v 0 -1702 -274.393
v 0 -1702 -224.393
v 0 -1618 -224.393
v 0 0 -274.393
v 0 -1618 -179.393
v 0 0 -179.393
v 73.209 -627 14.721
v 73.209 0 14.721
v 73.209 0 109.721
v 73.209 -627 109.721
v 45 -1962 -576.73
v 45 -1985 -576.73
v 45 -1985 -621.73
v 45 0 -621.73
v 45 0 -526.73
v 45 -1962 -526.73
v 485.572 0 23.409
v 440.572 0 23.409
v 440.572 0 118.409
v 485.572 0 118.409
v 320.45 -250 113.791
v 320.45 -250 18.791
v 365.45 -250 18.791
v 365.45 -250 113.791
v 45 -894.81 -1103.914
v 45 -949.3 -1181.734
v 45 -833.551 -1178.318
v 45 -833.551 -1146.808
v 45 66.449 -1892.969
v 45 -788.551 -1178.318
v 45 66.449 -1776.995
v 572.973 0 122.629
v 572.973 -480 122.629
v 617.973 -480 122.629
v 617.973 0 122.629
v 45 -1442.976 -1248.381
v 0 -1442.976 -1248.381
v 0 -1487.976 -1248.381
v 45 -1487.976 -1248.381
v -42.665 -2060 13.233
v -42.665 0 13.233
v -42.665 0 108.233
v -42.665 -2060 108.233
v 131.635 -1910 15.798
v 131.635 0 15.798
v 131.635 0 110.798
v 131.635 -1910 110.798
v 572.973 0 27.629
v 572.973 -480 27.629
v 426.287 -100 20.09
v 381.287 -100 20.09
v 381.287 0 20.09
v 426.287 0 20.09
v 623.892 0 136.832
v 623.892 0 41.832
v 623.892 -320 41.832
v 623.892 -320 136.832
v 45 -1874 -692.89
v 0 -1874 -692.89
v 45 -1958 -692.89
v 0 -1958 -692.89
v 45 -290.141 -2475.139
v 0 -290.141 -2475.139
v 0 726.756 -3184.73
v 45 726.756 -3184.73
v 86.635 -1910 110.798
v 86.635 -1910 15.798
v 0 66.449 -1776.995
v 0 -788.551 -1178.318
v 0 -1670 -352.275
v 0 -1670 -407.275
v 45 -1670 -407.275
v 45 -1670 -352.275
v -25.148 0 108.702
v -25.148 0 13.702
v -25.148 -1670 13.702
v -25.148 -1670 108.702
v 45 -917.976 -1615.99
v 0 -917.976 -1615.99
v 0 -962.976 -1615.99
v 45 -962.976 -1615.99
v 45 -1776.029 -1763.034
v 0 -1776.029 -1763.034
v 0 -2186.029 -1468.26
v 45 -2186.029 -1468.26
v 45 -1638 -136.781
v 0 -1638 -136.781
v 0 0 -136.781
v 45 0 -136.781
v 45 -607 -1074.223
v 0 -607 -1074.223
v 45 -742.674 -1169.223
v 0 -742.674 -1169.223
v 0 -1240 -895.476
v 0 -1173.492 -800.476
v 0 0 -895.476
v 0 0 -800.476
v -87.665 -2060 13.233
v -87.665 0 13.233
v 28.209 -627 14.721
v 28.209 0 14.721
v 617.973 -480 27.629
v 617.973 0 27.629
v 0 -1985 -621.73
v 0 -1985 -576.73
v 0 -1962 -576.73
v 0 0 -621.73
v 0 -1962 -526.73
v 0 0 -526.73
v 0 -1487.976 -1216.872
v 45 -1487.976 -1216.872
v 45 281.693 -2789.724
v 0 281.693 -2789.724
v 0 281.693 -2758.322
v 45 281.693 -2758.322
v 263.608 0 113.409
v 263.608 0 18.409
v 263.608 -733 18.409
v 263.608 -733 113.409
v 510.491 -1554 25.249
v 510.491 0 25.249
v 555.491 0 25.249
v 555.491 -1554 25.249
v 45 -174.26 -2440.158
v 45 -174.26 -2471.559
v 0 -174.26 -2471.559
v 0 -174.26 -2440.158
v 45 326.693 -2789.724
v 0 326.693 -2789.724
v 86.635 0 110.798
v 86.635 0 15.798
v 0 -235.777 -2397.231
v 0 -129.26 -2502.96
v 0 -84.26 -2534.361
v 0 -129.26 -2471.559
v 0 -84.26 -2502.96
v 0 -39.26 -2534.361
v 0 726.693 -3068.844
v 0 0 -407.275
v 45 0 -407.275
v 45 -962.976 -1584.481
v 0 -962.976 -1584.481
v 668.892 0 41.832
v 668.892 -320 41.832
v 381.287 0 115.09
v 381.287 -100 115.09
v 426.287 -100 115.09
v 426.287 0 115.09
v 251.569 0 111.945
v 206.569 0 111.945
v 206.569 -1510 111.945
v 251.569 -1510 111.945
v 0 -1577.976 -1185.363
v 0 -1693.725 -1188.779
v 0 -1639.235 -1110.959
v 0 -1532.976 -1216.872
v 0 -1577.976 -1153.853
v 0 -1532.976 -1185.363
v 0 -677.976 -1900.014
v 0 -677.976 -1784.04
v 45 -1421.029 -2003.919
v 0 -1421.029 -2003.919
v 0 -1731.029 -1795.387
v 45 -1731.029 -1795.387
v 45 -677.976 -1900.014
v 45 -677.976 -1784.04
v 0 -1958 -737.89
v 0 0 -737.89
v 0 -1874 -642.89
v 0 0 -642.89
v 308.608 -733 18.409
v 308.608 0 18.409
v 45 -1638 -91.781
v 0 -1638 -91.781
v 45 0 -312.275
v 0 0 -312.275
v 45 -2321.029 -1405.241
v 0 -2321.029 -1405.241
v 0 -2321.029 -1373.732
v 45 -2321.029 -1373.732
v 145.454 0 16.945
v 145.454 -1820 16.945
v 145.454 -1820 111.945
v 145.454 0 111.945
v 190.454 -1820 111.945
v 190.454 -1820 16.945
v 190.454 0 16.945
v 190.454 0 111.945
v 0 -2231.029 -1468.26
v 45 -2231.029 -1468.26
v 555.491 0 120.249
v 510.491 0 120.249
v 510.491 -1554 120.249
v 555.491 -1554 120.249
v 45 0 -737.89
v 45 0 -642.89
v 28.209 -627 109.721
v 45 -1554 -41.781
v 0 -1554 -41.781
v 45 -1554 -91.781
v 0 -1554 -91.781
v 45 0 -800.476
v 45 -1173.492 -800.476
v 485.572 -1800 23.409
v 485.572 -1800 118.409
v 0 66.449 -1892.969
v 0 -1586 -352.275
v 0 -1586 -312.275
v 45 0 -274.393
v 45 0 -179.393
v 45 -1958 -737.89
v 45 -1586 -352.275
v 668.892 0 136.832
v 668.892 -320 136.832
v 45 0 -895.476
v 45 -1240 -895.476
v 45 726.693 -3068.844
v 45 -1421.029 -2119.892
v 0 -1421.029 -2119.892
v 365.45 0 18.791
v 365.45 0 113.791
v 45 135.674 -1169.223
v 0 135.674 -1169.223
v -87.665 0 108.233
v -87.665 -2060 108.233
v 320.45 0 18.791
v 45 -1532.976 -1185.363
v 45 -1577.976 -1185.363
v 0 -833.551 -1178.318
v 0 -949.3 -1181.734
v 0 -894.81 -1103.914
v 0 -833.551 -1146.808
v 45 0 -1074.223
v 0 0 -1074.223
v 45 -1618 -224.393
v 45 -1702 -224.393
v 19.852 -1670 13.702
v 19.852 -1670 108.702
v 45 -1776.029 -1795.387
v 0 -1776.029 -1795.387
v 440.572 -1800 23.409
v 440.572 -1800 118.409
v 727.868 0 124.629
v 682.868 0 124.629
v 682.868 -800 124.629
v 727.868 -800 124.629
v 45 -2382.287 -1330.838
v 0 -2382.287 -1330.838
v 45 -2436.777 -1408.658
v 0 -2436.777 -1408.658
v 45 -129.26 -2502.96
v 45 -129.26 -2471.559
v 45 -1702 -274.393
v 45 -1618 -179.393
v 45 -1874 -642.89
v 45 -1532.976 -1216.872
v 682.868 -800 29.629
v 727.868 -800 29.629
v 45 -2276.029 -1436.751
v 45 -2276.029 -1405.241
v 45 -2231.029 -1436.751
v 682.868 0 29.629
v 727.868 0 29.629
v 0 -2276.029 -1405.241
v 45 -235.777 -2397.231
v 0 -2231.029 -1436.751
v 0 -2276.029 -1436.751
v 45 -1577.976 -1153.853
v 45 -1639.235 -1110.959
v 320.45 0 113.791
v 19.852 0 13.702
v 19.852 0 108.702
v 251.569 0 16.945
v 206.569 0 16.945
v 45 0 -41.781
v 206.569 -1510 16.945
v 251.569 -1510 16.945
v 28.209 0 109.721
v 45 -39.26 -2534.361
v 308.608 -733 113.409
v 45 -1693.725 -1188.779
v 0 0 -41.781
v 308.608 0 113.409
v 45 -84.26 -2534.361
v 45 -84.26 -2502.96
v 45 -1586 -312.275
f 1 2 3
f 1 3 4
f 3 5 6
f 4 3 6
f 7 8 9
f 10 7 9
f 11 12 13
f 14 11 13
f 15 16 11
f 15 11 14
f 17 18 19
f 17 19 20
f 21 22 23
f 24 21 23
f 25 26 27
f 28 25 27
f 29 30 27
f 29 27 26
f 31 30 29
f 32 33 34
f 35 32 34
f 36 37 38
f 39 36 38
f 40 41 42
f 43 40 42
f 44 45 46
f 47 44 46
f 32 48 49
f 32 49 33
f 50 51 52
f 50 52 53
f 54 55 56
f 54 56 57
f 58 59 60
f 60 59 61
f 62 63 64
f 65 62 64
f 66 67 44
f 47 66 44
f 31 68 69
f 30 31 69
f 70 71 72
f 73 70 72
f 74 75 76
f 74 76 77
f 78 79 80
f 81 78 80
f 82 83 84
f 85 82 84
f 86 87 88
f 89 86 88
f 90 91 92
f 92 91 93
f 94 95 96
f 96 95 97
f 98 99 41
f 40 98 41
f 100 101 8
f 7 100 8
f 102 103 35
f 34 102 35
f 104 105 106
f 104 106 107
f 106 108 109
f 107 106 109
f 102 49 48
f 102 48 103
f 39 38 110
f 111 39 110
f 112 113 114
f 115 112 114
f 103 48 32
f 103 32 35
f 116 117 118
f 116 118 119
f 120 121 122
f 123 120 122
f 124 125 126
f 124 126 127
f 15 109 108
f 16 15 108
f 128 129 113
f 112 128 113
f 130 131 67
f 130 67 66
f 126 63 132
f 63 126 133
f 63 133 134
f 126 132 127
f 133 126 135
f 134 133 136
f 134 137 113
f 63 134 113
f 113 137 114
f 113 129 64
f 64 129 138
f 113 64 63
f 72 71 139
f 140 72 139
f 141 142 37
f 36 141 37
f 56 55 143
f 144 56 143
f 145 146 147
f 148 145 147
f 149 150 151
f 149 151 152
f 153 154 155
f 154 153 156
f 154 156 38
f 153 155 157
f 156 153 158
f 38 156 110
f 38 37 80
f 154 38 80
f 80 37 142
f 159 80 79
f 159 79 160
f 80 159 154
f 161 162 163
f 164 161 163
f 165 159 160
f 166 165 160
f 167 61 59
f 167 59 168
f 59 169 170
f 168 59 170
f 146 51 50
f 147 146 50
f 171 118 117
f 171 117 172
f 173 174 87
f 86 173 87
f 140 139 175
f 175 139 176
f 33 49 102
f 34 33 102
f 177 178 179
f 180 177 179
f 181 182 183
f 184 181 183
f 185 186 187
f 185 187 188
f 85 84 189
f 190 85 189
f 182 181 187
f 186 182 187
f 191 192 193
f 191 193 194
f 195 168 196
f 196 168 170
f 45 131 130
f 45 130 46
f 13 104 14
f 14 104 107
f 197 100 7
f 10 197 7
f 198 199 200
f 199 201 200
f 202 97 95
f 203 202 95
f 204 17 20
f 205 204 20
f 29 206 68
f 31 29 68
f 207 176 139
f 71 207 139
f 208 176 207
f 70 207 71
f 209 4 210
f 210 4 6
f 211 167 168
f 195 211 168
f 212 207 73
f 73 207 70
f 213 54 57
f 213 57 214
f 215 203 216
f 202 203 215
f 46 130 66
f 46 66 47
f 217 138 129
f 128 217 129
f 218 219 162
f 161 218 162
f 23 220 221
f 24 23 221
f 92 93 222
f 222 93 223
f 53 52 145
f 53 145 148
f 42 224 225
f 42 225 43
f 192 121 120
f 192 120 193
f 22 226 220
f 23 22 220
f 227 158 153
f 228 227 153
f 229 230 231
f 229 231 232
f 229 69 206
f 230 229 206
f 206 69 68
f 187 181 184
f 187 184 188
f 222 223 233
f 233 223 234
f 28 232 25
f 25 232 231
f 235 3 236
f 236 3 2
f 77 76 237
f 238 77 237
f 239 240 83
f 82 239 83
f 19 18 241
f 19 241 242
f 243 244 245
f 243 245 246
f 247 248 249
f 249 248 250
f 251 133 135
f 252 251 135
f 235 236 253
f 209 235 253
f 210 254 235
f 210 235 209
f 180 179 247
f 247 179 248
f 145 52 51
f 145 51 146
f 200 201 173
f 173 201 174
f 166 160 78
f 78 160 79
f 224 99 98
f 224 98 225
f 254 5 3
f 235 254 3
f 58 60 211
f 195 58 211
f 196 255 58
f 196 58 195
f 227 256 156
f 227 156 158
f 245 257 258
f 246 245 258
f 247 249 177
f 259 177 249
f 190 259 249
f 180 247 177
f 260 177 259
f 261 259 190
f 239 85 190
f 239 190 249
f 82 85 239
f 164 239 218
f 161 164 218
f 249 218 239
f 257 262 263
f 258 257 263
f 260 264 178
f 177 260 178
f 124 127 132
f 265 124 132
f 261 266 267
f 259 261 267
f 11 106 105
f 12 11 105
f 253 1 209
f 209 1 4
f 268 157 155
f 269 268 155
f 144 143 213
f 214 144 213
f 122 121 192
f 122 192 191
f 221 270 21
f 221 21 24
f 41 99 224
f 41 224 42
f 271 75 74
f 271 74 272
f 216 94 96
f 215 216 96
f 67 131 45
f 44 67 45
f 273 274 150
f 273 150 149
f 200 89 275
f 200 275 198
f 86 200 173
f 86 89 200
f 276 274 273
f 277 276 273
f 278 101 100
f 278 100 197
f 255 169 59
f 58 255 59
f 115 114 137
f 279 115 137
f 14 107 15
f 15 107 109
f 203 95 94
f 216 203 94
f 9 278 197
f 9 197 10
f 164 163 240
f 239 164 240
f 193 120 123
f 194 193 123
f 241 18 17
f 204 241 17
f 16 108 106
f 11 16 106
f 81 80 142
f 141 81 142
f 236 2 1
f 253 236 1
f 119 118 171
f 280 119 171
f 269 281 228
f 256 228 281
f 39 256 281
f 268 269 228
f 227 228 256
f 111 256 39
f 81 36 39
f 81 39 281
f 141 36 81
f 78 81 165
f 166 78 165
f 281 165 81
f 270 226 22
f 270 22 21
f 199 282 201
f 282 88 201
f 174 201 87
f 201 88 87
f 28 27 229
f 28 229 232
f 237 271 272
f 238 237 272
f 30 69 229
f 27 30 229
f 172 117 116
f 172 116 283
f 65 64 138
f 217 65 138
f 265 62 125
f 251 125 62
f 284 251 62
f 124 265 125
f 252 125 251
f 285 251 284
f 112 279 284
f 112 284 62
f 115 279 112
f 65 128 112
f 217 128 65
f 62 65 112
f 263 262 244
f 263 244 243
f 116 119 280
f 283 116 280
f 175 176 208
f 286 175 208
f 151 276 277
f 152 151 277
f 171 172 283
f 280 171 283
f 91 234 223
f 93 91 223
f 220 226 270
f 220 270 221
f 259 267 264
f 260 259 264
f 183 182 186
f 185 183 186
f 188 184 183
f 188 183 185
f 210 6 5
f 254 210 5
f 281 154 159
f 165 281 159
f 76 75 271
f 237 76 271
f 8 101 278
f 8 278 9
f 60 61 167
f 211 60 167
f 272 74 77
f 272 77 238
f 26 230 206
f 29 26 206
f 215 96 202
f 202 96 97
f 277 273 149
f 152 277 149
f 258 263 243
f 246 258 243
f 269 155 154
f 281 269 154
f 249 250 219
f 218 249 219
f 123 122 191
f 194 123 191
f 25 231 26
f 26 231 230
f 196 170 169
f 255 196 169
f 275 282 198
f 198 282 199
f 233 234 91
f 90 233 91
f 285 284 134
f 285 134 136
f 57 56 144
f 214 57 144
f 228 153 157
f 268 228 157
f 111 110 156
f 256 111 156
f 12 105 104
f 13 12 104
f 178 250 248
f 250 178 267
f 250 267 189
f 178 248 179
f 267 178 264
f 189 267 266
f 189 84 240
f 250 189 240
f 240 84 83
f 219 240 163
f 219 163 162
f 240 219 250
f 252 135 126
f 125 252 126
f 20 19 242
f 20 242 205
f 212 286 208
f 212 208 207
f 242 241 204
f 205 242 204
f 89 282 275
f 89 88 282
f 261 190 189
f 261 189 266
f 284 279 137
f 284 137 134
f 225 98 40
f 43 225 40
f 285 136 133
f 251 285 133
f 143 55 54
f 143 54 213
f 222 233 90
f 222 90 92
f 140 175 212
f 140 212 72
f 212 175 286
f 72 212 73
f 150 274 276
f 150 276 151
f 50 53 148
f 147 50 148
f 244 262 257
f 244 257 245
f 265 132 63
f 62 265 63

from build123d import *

# Parameters (mm, degrees)
F0_W      = 45
F0_H      = 95
F1_DEPTH  = 2060
F2_W      = 45
F2_H      = 95
F3_DEPTH  = 1670
F4_W      = 45
F4_H      = 95
F5_DEPTH  = 627
F6_W      = 45
F6_H      = 95
F7_DEPTH  = 1910
F8_W      = 45
F8_H      = 95
F10_DEPTH = 1820
F9_W      = 45
F9_H      = 95
F11_DEPTH = 1510
F12_W     = 45
F12_H     = 95
F14_DEPTH = 733
F13_W     = 45
F13_H     = 95
F15_DEPTH = 250
F16_W     = 45
F16_H     = 95
F17_DEPTH = 100
F18_W     = 45
F18_H     = 95
F20_DEPTH = 1800
F19_W     = 45
F19_H     = 95
F21_DEPTH = 1554
F23_DEPTH = 45
F25_DEPTH = 45
F26_DEPTH = 5
F27_DEPTH = 5
F29_DEPTH = 45
F31_DEPTH = 45
F32_W     = 45
F32_H     = 95
F33_DEPTH = 480
F34_DEPTH = 5
F35_DEPTH = 5
F37_DEPTH = 45
F38_W     = 45
F38_H     = 95
F40_DEPTH = 320
F39_W     = 45
F39_H     = 95
F41_DEPTH = 800
F43_DEPTH = 45
F46_DEPTH = 45
F47_DEPTH = 45
F49_DEPTH = 45


with BuildPart() as f1:
    # F0 (on Front) → F1 (new body)
    with BuildSketch(Plane.XZ):
        with Locations((-65.1652917266, 60.7334716618)):
            Rectangle(F0_W, F0_H)
    extrude(amount=F1_DEPTH)


with BuildPart() as f3:
    # F2 (on Front) → F3 (new body)
    with BuildSketch(Plane.XZ):
        with Locations((-2.6481477171, 61.2016577646)):
            Rectangle(F2_W, F2_H)
    extrude(amount=F3_DEPTH)


with BuildPart() as f5:
    # F4 (on Front) → F5 (new body)
    with BuildSketch(Plane.XZ):
        with Locations((50.708630085, 62.2210871801)):
            Rectangle(F4_W, F4_H)
    extrude(amount=F5_DEPTH)


with BuildPart() as f7:
    # F6 (on Front) → F7 (new body)
    with BuildSketch(Plane.XZ):
        with Locations((109.135299027, 63.2982166857)):
            Rectangle(F6_W, F6_H)
    extrude(amount=F7_DEPTH)


with BuildPart() as f10:
    # F8 (on Front) → F10 (new body)
    with BuildSketch(Plane.XZ):
        with Locations((167.9542428255, 64.4452819973)):
            Rectangle(F8_W, F8_H)
    extrude(amount=F10_DEPTH)


with BuildPart() as f11:
    # F9 (on Front) → F11 (new body)
    with BuildSketch(Plane.XZ):
        with Locations((229.06876266, 64.4452819973)):
            Rectangle(F9_W, F9_H)
    extrude(amount=F11_DEPTH)


with BuildPart() as f14:
    # F12 (on Front) → F14 (new body)
    with BuildSketch(Plane.XZ):
        with Locations((286.1079359055, 65.9090528637)):
            Rectangle(F12_W, F12_H)
    extrude(amount=F14_DEPTH)


with BuildPart() as f15:
    # F13 (on Front) → F15 (new body)
    with BuildSketch(Plane.XZ):
        with Locations((342.9496204853, 66.2910441309)):
            Rectangle(F13_W, F13_H)
    extrude(amount=F15_DEPTH)


with BuildPart() as f17:
    # F16 (on Front) → F17 (new body)
    with BuildSketch(Plane.XZ):
        with Locations((403.7870085239, 67.5900323689)):
            Rectangle(F16_W, F16_H)
    extrude(amount=F17_DEPTH)


with BuildPart() as f20:
    # F18 (on Front) → F20 (new body)
    with BuildSketch(Plane.XZ):
        with Locations((463.072232008, 70.9092958272)):
            Rectangle(F18_W, F18_H)
    extrude(amount=F20_DEPTH)


with BuildPart() as f21:
    # F19 (on Front) → F21 (new body)
    with BuildSketch(Plane.XZ):
        with Locations((532.9907751083, 72.7492576838)):
            Rectangle(F19_W, F19_H)
    extrude(amount=F21_DEPTH)


with BuildPart() as f23:
    # F22 (on Right) → F23 (new body)
    with BuildSketch(Plane.YZ):
        Polygon((-1638, -136.78124547), (0, -136.78124547), (0, -46.78124547), (-1554, -46.78124547), (-1554, -91.78124547), (-1638, -91.78124547), align=None)
    extrude(amount=F23_DEPTH)

    # F26 (add): a face of the model
    f26_faces = [f23.faces().sort_by_distance(p)[0] for p in [
        (22.5, -777, -46.78124547),
    ]]
    extrude(f26_faces, amount=F26_DEPTH)


with BuildPart() as f25:
    # F24 (on Right) → F25 (new body)
    with BuildSketch(Plane.YZ):
        Polygon((0, -407.274633646), (0, -312.274633646), (-1586, -312.274633646), (-1586, -357.274633646), (-1670, -357.274633646), (-1670, -407.274633646), align=None)
    extrude(amount=F25_DEPTH)

    # F27 (add): a face of the model
    f27_faces = [f25.faces().sort_by_distance(p)[0] for p in [
        (22.5, -1628, -357.274633646),
    ]]
    extrude(f27_faces, amount=F27_DEPTH)

    # F34 (add): a face of the model
    f34_faces = [f25.faces().sort_by_distance(p)[0] for p in [
        (22.5, -1628, -352.274633646),
    ]]
    extrude(f34_faces, amount=-F34_DEPTH)

    # F35 (add): a face of the model
    f35_faces = [f25.faces().sort_by_distance(p)[0] for p in [
        (22.5, -1628, -352.274633646),
    ]]
    extrude(f35_faces, amount=-F35_DEPTH)


with BuildPart() as f29:
    # F28 (on Right) → F29 (new body)
    with BuildSketch(Plane.YZ):
        Polygon((0, -274.3932902813), (0, -179.3932902813), (-1618, -179.3932902813), (-1618, -224.3932902813), (-1702, -224.3932902813), (-1702, -274.3932902813), align=None)
    extrude(amount=F29_DEPTH)


with BuildPart() as f31:
    # F30 (on Right) → F31 (new body)
    with BuildSketch(Plane.YZ):
        Polygon((0, -621.7302680016), (0, -526.7302680016), (-1962, -526.7302680016), (-1962, -576.7302680016), (-1985, -576.7302680016), (-1985, -621.7302680016), align=None)
    extrude(amount=F31_DEPTH)


with BuildPart() as f33:
    # F32 (on Front) → F33 (new body)
    with BuildSketch(Plane.XZ):
        with Locations((595.4729533195, 75.1294462383)):
            Rectangle(F32_W, F32_H)
    extrude(amount=F33_DEPTH)


with BuildPart() as f37:
    # F36 (on Right) → F37 (new body)
    with BuildSketch(Plane.YZ):
        Polygon((0, -737.8901839256), (0, -642.8901839256), (-1874, -642.8901839256), (-1874, -692.8901839256), (-1958, -692.8901839256), (-1958, -737.8901839256), align=None)
    extrude(amount=F37_DEPTH)


with BuildPart() as f40:
    # F38 (on Front) → F40 (new body)
    with BuildSketch(Plane.XZ):
        with Locations((646.3923239708, 89.3315157294)):
            Rectangle(F38_W, F38_H)
    extrude(amount=F40_DEPTH)


with BuildPart() as f41:
    # F39 (on Front) → F41 (new body)
    with BuildSketch(Plane.XZ):
        with Locations((705.3681993484, 77.1294745058)):
            Rectangle(F39_W, F39_H)
    extrude(amount=F41_DEPTH)


with BuildPart() as f43:
    # F42 (on Right) → F43 (new body)
    with BuildSketch(Plane.YZ):
        Polygon((0, -895.4758358002), (0, -800.4758358002), (-1173.492193222, -800.4758358002), (-1240, -895.4758358002), align=None)
    extrude(amount=F43_DEPTH)


with BuildPart() as f46:
    # F45 (on Right) → F46 (new body)
    with BuildSketch(Plane.YZ):
        Polygon((0, -1074.2228031158), (-607, -1074.2228031158), (-742.6740606405, -1169.2228031158), (-607, -1169.2228031158), (135.6740606405, -1169.2228031158), align=None)
    extrude(amount=F46_DEPTH)


with BuildPart() as f47:
    # F44 (on Right) → F47 (new body)
    with BuildSketch(Plane.YZ):
        Polygon((-894.810178936, -1103.9144259572), (-949.2999403894, -1181.7338701647), (66.448594529, -1892.96865124), (66.448594529, -1776.9950653076), (-173.551405471, -1608.9452561373), (-218.551405471, -1577.4359169179), (-788.551405471, -1178.3176201383), (-833.551405471, -1178.3176201383), (-833.551405471, -1146.8082809189), align=None)
    extrude(amount=F47_DEPTH)


with BuildPart() as f47b:
    # F44 (on Right) → F47, piece 2 (new body)
    with BuildSketch(Plane.YZ):
        Polygon((-1639.2352284377, -1110.9594330508), (-1693.7249898911, -1188.7788772583), (-677.9764549727, -1900.0136583336), (-677.9764549727, -1784.0400724013), (-917.9764549727, -1615.9902632309), (-962.9764549727, -1615.9902632309), (-962.9764549727, -1584.4809240115), (-1442.9764549727, -1248.3813056708), (-1487.9764549727, -1248.3813056708), (-1487.9764549727, -1216.8719664514), (-1532.9764549727, -1216.8719664514), (-1532.9764549727, -1185.362627232), (-1577.9764549727, -1185.362627232), (-1577.9764549727, -1153.8532880125), align=None)
    extrude(amount=F47_DEPTH)


with BuildPart() as f47c:
    # F44 (on Right) → F47, piece 3 (new body)
    with BuildSketch(Plane.YZ):
        Polygon((-2382.2874218827, -1330.8382493139), (-2436.777183336, -1408.6576935213), (-1421.0286484177, -2119.8924745966), (-1421.0286484177, -2003.9188886643), (-1731.0286484177, -1795.3871488571), (-1776.0286484177, -1795.3871488571), (-1776.0286484177, -1763.0339264142), (-2186.0286484177, -1468.2601219338), (-2231.0286484177, -1468.2601219338), (-2231.0286484177, -1436.7507827144), (-2276.0286484177, -1436.7507827144), (-2276.0286484177, -1405.241443495), (-2321.0286484177, -1405.241443495), (-2321.0286484177, -1373.7321042755), align=None)
    extrude(amount=F47_DEPTH)


with BuildPart() as f49:
    # F48 (on Right) → F49 (new body)
    with BuildSketch(Plane.YZ):
        Polygon((-290.1412724141, -2475.1386475671), (726.7558623421, -3184.7302324415), (726.6930590229, -3068.8438161276), (326.6930590229, -2789.7235155106), (281.6930590229, -2789.7235155106), (281.6930590229, -2758.3224816911), (-39.2601053822, -2534.3611223593), (-84.2601053822, -2534.3611223593), (-84.2601053822, -2502.9600885399), (-129.2601053822, -2502.9600885399), (-129.2601053822, -2471.5590547205), (-174.2601053822, -2471.5590547205), (-174.2601053822, -2440.1580209011), (-235.7774009923, -2397.2312057915), align=None)
    extrude(amount=F49_DEPTH)


solid = Compound([f1.part, f3.part, f5.part, f7.part, f10.part, f11.part, f14.part, f15.part, f17.part, f20.part, f21.part, f23.part, f25.part, f29.part, f31.part, f33.part, f37.part, f40.part, f41.part, f43.part, f46.part, f47.part, f47b.part, f47c.part, f49.part])
